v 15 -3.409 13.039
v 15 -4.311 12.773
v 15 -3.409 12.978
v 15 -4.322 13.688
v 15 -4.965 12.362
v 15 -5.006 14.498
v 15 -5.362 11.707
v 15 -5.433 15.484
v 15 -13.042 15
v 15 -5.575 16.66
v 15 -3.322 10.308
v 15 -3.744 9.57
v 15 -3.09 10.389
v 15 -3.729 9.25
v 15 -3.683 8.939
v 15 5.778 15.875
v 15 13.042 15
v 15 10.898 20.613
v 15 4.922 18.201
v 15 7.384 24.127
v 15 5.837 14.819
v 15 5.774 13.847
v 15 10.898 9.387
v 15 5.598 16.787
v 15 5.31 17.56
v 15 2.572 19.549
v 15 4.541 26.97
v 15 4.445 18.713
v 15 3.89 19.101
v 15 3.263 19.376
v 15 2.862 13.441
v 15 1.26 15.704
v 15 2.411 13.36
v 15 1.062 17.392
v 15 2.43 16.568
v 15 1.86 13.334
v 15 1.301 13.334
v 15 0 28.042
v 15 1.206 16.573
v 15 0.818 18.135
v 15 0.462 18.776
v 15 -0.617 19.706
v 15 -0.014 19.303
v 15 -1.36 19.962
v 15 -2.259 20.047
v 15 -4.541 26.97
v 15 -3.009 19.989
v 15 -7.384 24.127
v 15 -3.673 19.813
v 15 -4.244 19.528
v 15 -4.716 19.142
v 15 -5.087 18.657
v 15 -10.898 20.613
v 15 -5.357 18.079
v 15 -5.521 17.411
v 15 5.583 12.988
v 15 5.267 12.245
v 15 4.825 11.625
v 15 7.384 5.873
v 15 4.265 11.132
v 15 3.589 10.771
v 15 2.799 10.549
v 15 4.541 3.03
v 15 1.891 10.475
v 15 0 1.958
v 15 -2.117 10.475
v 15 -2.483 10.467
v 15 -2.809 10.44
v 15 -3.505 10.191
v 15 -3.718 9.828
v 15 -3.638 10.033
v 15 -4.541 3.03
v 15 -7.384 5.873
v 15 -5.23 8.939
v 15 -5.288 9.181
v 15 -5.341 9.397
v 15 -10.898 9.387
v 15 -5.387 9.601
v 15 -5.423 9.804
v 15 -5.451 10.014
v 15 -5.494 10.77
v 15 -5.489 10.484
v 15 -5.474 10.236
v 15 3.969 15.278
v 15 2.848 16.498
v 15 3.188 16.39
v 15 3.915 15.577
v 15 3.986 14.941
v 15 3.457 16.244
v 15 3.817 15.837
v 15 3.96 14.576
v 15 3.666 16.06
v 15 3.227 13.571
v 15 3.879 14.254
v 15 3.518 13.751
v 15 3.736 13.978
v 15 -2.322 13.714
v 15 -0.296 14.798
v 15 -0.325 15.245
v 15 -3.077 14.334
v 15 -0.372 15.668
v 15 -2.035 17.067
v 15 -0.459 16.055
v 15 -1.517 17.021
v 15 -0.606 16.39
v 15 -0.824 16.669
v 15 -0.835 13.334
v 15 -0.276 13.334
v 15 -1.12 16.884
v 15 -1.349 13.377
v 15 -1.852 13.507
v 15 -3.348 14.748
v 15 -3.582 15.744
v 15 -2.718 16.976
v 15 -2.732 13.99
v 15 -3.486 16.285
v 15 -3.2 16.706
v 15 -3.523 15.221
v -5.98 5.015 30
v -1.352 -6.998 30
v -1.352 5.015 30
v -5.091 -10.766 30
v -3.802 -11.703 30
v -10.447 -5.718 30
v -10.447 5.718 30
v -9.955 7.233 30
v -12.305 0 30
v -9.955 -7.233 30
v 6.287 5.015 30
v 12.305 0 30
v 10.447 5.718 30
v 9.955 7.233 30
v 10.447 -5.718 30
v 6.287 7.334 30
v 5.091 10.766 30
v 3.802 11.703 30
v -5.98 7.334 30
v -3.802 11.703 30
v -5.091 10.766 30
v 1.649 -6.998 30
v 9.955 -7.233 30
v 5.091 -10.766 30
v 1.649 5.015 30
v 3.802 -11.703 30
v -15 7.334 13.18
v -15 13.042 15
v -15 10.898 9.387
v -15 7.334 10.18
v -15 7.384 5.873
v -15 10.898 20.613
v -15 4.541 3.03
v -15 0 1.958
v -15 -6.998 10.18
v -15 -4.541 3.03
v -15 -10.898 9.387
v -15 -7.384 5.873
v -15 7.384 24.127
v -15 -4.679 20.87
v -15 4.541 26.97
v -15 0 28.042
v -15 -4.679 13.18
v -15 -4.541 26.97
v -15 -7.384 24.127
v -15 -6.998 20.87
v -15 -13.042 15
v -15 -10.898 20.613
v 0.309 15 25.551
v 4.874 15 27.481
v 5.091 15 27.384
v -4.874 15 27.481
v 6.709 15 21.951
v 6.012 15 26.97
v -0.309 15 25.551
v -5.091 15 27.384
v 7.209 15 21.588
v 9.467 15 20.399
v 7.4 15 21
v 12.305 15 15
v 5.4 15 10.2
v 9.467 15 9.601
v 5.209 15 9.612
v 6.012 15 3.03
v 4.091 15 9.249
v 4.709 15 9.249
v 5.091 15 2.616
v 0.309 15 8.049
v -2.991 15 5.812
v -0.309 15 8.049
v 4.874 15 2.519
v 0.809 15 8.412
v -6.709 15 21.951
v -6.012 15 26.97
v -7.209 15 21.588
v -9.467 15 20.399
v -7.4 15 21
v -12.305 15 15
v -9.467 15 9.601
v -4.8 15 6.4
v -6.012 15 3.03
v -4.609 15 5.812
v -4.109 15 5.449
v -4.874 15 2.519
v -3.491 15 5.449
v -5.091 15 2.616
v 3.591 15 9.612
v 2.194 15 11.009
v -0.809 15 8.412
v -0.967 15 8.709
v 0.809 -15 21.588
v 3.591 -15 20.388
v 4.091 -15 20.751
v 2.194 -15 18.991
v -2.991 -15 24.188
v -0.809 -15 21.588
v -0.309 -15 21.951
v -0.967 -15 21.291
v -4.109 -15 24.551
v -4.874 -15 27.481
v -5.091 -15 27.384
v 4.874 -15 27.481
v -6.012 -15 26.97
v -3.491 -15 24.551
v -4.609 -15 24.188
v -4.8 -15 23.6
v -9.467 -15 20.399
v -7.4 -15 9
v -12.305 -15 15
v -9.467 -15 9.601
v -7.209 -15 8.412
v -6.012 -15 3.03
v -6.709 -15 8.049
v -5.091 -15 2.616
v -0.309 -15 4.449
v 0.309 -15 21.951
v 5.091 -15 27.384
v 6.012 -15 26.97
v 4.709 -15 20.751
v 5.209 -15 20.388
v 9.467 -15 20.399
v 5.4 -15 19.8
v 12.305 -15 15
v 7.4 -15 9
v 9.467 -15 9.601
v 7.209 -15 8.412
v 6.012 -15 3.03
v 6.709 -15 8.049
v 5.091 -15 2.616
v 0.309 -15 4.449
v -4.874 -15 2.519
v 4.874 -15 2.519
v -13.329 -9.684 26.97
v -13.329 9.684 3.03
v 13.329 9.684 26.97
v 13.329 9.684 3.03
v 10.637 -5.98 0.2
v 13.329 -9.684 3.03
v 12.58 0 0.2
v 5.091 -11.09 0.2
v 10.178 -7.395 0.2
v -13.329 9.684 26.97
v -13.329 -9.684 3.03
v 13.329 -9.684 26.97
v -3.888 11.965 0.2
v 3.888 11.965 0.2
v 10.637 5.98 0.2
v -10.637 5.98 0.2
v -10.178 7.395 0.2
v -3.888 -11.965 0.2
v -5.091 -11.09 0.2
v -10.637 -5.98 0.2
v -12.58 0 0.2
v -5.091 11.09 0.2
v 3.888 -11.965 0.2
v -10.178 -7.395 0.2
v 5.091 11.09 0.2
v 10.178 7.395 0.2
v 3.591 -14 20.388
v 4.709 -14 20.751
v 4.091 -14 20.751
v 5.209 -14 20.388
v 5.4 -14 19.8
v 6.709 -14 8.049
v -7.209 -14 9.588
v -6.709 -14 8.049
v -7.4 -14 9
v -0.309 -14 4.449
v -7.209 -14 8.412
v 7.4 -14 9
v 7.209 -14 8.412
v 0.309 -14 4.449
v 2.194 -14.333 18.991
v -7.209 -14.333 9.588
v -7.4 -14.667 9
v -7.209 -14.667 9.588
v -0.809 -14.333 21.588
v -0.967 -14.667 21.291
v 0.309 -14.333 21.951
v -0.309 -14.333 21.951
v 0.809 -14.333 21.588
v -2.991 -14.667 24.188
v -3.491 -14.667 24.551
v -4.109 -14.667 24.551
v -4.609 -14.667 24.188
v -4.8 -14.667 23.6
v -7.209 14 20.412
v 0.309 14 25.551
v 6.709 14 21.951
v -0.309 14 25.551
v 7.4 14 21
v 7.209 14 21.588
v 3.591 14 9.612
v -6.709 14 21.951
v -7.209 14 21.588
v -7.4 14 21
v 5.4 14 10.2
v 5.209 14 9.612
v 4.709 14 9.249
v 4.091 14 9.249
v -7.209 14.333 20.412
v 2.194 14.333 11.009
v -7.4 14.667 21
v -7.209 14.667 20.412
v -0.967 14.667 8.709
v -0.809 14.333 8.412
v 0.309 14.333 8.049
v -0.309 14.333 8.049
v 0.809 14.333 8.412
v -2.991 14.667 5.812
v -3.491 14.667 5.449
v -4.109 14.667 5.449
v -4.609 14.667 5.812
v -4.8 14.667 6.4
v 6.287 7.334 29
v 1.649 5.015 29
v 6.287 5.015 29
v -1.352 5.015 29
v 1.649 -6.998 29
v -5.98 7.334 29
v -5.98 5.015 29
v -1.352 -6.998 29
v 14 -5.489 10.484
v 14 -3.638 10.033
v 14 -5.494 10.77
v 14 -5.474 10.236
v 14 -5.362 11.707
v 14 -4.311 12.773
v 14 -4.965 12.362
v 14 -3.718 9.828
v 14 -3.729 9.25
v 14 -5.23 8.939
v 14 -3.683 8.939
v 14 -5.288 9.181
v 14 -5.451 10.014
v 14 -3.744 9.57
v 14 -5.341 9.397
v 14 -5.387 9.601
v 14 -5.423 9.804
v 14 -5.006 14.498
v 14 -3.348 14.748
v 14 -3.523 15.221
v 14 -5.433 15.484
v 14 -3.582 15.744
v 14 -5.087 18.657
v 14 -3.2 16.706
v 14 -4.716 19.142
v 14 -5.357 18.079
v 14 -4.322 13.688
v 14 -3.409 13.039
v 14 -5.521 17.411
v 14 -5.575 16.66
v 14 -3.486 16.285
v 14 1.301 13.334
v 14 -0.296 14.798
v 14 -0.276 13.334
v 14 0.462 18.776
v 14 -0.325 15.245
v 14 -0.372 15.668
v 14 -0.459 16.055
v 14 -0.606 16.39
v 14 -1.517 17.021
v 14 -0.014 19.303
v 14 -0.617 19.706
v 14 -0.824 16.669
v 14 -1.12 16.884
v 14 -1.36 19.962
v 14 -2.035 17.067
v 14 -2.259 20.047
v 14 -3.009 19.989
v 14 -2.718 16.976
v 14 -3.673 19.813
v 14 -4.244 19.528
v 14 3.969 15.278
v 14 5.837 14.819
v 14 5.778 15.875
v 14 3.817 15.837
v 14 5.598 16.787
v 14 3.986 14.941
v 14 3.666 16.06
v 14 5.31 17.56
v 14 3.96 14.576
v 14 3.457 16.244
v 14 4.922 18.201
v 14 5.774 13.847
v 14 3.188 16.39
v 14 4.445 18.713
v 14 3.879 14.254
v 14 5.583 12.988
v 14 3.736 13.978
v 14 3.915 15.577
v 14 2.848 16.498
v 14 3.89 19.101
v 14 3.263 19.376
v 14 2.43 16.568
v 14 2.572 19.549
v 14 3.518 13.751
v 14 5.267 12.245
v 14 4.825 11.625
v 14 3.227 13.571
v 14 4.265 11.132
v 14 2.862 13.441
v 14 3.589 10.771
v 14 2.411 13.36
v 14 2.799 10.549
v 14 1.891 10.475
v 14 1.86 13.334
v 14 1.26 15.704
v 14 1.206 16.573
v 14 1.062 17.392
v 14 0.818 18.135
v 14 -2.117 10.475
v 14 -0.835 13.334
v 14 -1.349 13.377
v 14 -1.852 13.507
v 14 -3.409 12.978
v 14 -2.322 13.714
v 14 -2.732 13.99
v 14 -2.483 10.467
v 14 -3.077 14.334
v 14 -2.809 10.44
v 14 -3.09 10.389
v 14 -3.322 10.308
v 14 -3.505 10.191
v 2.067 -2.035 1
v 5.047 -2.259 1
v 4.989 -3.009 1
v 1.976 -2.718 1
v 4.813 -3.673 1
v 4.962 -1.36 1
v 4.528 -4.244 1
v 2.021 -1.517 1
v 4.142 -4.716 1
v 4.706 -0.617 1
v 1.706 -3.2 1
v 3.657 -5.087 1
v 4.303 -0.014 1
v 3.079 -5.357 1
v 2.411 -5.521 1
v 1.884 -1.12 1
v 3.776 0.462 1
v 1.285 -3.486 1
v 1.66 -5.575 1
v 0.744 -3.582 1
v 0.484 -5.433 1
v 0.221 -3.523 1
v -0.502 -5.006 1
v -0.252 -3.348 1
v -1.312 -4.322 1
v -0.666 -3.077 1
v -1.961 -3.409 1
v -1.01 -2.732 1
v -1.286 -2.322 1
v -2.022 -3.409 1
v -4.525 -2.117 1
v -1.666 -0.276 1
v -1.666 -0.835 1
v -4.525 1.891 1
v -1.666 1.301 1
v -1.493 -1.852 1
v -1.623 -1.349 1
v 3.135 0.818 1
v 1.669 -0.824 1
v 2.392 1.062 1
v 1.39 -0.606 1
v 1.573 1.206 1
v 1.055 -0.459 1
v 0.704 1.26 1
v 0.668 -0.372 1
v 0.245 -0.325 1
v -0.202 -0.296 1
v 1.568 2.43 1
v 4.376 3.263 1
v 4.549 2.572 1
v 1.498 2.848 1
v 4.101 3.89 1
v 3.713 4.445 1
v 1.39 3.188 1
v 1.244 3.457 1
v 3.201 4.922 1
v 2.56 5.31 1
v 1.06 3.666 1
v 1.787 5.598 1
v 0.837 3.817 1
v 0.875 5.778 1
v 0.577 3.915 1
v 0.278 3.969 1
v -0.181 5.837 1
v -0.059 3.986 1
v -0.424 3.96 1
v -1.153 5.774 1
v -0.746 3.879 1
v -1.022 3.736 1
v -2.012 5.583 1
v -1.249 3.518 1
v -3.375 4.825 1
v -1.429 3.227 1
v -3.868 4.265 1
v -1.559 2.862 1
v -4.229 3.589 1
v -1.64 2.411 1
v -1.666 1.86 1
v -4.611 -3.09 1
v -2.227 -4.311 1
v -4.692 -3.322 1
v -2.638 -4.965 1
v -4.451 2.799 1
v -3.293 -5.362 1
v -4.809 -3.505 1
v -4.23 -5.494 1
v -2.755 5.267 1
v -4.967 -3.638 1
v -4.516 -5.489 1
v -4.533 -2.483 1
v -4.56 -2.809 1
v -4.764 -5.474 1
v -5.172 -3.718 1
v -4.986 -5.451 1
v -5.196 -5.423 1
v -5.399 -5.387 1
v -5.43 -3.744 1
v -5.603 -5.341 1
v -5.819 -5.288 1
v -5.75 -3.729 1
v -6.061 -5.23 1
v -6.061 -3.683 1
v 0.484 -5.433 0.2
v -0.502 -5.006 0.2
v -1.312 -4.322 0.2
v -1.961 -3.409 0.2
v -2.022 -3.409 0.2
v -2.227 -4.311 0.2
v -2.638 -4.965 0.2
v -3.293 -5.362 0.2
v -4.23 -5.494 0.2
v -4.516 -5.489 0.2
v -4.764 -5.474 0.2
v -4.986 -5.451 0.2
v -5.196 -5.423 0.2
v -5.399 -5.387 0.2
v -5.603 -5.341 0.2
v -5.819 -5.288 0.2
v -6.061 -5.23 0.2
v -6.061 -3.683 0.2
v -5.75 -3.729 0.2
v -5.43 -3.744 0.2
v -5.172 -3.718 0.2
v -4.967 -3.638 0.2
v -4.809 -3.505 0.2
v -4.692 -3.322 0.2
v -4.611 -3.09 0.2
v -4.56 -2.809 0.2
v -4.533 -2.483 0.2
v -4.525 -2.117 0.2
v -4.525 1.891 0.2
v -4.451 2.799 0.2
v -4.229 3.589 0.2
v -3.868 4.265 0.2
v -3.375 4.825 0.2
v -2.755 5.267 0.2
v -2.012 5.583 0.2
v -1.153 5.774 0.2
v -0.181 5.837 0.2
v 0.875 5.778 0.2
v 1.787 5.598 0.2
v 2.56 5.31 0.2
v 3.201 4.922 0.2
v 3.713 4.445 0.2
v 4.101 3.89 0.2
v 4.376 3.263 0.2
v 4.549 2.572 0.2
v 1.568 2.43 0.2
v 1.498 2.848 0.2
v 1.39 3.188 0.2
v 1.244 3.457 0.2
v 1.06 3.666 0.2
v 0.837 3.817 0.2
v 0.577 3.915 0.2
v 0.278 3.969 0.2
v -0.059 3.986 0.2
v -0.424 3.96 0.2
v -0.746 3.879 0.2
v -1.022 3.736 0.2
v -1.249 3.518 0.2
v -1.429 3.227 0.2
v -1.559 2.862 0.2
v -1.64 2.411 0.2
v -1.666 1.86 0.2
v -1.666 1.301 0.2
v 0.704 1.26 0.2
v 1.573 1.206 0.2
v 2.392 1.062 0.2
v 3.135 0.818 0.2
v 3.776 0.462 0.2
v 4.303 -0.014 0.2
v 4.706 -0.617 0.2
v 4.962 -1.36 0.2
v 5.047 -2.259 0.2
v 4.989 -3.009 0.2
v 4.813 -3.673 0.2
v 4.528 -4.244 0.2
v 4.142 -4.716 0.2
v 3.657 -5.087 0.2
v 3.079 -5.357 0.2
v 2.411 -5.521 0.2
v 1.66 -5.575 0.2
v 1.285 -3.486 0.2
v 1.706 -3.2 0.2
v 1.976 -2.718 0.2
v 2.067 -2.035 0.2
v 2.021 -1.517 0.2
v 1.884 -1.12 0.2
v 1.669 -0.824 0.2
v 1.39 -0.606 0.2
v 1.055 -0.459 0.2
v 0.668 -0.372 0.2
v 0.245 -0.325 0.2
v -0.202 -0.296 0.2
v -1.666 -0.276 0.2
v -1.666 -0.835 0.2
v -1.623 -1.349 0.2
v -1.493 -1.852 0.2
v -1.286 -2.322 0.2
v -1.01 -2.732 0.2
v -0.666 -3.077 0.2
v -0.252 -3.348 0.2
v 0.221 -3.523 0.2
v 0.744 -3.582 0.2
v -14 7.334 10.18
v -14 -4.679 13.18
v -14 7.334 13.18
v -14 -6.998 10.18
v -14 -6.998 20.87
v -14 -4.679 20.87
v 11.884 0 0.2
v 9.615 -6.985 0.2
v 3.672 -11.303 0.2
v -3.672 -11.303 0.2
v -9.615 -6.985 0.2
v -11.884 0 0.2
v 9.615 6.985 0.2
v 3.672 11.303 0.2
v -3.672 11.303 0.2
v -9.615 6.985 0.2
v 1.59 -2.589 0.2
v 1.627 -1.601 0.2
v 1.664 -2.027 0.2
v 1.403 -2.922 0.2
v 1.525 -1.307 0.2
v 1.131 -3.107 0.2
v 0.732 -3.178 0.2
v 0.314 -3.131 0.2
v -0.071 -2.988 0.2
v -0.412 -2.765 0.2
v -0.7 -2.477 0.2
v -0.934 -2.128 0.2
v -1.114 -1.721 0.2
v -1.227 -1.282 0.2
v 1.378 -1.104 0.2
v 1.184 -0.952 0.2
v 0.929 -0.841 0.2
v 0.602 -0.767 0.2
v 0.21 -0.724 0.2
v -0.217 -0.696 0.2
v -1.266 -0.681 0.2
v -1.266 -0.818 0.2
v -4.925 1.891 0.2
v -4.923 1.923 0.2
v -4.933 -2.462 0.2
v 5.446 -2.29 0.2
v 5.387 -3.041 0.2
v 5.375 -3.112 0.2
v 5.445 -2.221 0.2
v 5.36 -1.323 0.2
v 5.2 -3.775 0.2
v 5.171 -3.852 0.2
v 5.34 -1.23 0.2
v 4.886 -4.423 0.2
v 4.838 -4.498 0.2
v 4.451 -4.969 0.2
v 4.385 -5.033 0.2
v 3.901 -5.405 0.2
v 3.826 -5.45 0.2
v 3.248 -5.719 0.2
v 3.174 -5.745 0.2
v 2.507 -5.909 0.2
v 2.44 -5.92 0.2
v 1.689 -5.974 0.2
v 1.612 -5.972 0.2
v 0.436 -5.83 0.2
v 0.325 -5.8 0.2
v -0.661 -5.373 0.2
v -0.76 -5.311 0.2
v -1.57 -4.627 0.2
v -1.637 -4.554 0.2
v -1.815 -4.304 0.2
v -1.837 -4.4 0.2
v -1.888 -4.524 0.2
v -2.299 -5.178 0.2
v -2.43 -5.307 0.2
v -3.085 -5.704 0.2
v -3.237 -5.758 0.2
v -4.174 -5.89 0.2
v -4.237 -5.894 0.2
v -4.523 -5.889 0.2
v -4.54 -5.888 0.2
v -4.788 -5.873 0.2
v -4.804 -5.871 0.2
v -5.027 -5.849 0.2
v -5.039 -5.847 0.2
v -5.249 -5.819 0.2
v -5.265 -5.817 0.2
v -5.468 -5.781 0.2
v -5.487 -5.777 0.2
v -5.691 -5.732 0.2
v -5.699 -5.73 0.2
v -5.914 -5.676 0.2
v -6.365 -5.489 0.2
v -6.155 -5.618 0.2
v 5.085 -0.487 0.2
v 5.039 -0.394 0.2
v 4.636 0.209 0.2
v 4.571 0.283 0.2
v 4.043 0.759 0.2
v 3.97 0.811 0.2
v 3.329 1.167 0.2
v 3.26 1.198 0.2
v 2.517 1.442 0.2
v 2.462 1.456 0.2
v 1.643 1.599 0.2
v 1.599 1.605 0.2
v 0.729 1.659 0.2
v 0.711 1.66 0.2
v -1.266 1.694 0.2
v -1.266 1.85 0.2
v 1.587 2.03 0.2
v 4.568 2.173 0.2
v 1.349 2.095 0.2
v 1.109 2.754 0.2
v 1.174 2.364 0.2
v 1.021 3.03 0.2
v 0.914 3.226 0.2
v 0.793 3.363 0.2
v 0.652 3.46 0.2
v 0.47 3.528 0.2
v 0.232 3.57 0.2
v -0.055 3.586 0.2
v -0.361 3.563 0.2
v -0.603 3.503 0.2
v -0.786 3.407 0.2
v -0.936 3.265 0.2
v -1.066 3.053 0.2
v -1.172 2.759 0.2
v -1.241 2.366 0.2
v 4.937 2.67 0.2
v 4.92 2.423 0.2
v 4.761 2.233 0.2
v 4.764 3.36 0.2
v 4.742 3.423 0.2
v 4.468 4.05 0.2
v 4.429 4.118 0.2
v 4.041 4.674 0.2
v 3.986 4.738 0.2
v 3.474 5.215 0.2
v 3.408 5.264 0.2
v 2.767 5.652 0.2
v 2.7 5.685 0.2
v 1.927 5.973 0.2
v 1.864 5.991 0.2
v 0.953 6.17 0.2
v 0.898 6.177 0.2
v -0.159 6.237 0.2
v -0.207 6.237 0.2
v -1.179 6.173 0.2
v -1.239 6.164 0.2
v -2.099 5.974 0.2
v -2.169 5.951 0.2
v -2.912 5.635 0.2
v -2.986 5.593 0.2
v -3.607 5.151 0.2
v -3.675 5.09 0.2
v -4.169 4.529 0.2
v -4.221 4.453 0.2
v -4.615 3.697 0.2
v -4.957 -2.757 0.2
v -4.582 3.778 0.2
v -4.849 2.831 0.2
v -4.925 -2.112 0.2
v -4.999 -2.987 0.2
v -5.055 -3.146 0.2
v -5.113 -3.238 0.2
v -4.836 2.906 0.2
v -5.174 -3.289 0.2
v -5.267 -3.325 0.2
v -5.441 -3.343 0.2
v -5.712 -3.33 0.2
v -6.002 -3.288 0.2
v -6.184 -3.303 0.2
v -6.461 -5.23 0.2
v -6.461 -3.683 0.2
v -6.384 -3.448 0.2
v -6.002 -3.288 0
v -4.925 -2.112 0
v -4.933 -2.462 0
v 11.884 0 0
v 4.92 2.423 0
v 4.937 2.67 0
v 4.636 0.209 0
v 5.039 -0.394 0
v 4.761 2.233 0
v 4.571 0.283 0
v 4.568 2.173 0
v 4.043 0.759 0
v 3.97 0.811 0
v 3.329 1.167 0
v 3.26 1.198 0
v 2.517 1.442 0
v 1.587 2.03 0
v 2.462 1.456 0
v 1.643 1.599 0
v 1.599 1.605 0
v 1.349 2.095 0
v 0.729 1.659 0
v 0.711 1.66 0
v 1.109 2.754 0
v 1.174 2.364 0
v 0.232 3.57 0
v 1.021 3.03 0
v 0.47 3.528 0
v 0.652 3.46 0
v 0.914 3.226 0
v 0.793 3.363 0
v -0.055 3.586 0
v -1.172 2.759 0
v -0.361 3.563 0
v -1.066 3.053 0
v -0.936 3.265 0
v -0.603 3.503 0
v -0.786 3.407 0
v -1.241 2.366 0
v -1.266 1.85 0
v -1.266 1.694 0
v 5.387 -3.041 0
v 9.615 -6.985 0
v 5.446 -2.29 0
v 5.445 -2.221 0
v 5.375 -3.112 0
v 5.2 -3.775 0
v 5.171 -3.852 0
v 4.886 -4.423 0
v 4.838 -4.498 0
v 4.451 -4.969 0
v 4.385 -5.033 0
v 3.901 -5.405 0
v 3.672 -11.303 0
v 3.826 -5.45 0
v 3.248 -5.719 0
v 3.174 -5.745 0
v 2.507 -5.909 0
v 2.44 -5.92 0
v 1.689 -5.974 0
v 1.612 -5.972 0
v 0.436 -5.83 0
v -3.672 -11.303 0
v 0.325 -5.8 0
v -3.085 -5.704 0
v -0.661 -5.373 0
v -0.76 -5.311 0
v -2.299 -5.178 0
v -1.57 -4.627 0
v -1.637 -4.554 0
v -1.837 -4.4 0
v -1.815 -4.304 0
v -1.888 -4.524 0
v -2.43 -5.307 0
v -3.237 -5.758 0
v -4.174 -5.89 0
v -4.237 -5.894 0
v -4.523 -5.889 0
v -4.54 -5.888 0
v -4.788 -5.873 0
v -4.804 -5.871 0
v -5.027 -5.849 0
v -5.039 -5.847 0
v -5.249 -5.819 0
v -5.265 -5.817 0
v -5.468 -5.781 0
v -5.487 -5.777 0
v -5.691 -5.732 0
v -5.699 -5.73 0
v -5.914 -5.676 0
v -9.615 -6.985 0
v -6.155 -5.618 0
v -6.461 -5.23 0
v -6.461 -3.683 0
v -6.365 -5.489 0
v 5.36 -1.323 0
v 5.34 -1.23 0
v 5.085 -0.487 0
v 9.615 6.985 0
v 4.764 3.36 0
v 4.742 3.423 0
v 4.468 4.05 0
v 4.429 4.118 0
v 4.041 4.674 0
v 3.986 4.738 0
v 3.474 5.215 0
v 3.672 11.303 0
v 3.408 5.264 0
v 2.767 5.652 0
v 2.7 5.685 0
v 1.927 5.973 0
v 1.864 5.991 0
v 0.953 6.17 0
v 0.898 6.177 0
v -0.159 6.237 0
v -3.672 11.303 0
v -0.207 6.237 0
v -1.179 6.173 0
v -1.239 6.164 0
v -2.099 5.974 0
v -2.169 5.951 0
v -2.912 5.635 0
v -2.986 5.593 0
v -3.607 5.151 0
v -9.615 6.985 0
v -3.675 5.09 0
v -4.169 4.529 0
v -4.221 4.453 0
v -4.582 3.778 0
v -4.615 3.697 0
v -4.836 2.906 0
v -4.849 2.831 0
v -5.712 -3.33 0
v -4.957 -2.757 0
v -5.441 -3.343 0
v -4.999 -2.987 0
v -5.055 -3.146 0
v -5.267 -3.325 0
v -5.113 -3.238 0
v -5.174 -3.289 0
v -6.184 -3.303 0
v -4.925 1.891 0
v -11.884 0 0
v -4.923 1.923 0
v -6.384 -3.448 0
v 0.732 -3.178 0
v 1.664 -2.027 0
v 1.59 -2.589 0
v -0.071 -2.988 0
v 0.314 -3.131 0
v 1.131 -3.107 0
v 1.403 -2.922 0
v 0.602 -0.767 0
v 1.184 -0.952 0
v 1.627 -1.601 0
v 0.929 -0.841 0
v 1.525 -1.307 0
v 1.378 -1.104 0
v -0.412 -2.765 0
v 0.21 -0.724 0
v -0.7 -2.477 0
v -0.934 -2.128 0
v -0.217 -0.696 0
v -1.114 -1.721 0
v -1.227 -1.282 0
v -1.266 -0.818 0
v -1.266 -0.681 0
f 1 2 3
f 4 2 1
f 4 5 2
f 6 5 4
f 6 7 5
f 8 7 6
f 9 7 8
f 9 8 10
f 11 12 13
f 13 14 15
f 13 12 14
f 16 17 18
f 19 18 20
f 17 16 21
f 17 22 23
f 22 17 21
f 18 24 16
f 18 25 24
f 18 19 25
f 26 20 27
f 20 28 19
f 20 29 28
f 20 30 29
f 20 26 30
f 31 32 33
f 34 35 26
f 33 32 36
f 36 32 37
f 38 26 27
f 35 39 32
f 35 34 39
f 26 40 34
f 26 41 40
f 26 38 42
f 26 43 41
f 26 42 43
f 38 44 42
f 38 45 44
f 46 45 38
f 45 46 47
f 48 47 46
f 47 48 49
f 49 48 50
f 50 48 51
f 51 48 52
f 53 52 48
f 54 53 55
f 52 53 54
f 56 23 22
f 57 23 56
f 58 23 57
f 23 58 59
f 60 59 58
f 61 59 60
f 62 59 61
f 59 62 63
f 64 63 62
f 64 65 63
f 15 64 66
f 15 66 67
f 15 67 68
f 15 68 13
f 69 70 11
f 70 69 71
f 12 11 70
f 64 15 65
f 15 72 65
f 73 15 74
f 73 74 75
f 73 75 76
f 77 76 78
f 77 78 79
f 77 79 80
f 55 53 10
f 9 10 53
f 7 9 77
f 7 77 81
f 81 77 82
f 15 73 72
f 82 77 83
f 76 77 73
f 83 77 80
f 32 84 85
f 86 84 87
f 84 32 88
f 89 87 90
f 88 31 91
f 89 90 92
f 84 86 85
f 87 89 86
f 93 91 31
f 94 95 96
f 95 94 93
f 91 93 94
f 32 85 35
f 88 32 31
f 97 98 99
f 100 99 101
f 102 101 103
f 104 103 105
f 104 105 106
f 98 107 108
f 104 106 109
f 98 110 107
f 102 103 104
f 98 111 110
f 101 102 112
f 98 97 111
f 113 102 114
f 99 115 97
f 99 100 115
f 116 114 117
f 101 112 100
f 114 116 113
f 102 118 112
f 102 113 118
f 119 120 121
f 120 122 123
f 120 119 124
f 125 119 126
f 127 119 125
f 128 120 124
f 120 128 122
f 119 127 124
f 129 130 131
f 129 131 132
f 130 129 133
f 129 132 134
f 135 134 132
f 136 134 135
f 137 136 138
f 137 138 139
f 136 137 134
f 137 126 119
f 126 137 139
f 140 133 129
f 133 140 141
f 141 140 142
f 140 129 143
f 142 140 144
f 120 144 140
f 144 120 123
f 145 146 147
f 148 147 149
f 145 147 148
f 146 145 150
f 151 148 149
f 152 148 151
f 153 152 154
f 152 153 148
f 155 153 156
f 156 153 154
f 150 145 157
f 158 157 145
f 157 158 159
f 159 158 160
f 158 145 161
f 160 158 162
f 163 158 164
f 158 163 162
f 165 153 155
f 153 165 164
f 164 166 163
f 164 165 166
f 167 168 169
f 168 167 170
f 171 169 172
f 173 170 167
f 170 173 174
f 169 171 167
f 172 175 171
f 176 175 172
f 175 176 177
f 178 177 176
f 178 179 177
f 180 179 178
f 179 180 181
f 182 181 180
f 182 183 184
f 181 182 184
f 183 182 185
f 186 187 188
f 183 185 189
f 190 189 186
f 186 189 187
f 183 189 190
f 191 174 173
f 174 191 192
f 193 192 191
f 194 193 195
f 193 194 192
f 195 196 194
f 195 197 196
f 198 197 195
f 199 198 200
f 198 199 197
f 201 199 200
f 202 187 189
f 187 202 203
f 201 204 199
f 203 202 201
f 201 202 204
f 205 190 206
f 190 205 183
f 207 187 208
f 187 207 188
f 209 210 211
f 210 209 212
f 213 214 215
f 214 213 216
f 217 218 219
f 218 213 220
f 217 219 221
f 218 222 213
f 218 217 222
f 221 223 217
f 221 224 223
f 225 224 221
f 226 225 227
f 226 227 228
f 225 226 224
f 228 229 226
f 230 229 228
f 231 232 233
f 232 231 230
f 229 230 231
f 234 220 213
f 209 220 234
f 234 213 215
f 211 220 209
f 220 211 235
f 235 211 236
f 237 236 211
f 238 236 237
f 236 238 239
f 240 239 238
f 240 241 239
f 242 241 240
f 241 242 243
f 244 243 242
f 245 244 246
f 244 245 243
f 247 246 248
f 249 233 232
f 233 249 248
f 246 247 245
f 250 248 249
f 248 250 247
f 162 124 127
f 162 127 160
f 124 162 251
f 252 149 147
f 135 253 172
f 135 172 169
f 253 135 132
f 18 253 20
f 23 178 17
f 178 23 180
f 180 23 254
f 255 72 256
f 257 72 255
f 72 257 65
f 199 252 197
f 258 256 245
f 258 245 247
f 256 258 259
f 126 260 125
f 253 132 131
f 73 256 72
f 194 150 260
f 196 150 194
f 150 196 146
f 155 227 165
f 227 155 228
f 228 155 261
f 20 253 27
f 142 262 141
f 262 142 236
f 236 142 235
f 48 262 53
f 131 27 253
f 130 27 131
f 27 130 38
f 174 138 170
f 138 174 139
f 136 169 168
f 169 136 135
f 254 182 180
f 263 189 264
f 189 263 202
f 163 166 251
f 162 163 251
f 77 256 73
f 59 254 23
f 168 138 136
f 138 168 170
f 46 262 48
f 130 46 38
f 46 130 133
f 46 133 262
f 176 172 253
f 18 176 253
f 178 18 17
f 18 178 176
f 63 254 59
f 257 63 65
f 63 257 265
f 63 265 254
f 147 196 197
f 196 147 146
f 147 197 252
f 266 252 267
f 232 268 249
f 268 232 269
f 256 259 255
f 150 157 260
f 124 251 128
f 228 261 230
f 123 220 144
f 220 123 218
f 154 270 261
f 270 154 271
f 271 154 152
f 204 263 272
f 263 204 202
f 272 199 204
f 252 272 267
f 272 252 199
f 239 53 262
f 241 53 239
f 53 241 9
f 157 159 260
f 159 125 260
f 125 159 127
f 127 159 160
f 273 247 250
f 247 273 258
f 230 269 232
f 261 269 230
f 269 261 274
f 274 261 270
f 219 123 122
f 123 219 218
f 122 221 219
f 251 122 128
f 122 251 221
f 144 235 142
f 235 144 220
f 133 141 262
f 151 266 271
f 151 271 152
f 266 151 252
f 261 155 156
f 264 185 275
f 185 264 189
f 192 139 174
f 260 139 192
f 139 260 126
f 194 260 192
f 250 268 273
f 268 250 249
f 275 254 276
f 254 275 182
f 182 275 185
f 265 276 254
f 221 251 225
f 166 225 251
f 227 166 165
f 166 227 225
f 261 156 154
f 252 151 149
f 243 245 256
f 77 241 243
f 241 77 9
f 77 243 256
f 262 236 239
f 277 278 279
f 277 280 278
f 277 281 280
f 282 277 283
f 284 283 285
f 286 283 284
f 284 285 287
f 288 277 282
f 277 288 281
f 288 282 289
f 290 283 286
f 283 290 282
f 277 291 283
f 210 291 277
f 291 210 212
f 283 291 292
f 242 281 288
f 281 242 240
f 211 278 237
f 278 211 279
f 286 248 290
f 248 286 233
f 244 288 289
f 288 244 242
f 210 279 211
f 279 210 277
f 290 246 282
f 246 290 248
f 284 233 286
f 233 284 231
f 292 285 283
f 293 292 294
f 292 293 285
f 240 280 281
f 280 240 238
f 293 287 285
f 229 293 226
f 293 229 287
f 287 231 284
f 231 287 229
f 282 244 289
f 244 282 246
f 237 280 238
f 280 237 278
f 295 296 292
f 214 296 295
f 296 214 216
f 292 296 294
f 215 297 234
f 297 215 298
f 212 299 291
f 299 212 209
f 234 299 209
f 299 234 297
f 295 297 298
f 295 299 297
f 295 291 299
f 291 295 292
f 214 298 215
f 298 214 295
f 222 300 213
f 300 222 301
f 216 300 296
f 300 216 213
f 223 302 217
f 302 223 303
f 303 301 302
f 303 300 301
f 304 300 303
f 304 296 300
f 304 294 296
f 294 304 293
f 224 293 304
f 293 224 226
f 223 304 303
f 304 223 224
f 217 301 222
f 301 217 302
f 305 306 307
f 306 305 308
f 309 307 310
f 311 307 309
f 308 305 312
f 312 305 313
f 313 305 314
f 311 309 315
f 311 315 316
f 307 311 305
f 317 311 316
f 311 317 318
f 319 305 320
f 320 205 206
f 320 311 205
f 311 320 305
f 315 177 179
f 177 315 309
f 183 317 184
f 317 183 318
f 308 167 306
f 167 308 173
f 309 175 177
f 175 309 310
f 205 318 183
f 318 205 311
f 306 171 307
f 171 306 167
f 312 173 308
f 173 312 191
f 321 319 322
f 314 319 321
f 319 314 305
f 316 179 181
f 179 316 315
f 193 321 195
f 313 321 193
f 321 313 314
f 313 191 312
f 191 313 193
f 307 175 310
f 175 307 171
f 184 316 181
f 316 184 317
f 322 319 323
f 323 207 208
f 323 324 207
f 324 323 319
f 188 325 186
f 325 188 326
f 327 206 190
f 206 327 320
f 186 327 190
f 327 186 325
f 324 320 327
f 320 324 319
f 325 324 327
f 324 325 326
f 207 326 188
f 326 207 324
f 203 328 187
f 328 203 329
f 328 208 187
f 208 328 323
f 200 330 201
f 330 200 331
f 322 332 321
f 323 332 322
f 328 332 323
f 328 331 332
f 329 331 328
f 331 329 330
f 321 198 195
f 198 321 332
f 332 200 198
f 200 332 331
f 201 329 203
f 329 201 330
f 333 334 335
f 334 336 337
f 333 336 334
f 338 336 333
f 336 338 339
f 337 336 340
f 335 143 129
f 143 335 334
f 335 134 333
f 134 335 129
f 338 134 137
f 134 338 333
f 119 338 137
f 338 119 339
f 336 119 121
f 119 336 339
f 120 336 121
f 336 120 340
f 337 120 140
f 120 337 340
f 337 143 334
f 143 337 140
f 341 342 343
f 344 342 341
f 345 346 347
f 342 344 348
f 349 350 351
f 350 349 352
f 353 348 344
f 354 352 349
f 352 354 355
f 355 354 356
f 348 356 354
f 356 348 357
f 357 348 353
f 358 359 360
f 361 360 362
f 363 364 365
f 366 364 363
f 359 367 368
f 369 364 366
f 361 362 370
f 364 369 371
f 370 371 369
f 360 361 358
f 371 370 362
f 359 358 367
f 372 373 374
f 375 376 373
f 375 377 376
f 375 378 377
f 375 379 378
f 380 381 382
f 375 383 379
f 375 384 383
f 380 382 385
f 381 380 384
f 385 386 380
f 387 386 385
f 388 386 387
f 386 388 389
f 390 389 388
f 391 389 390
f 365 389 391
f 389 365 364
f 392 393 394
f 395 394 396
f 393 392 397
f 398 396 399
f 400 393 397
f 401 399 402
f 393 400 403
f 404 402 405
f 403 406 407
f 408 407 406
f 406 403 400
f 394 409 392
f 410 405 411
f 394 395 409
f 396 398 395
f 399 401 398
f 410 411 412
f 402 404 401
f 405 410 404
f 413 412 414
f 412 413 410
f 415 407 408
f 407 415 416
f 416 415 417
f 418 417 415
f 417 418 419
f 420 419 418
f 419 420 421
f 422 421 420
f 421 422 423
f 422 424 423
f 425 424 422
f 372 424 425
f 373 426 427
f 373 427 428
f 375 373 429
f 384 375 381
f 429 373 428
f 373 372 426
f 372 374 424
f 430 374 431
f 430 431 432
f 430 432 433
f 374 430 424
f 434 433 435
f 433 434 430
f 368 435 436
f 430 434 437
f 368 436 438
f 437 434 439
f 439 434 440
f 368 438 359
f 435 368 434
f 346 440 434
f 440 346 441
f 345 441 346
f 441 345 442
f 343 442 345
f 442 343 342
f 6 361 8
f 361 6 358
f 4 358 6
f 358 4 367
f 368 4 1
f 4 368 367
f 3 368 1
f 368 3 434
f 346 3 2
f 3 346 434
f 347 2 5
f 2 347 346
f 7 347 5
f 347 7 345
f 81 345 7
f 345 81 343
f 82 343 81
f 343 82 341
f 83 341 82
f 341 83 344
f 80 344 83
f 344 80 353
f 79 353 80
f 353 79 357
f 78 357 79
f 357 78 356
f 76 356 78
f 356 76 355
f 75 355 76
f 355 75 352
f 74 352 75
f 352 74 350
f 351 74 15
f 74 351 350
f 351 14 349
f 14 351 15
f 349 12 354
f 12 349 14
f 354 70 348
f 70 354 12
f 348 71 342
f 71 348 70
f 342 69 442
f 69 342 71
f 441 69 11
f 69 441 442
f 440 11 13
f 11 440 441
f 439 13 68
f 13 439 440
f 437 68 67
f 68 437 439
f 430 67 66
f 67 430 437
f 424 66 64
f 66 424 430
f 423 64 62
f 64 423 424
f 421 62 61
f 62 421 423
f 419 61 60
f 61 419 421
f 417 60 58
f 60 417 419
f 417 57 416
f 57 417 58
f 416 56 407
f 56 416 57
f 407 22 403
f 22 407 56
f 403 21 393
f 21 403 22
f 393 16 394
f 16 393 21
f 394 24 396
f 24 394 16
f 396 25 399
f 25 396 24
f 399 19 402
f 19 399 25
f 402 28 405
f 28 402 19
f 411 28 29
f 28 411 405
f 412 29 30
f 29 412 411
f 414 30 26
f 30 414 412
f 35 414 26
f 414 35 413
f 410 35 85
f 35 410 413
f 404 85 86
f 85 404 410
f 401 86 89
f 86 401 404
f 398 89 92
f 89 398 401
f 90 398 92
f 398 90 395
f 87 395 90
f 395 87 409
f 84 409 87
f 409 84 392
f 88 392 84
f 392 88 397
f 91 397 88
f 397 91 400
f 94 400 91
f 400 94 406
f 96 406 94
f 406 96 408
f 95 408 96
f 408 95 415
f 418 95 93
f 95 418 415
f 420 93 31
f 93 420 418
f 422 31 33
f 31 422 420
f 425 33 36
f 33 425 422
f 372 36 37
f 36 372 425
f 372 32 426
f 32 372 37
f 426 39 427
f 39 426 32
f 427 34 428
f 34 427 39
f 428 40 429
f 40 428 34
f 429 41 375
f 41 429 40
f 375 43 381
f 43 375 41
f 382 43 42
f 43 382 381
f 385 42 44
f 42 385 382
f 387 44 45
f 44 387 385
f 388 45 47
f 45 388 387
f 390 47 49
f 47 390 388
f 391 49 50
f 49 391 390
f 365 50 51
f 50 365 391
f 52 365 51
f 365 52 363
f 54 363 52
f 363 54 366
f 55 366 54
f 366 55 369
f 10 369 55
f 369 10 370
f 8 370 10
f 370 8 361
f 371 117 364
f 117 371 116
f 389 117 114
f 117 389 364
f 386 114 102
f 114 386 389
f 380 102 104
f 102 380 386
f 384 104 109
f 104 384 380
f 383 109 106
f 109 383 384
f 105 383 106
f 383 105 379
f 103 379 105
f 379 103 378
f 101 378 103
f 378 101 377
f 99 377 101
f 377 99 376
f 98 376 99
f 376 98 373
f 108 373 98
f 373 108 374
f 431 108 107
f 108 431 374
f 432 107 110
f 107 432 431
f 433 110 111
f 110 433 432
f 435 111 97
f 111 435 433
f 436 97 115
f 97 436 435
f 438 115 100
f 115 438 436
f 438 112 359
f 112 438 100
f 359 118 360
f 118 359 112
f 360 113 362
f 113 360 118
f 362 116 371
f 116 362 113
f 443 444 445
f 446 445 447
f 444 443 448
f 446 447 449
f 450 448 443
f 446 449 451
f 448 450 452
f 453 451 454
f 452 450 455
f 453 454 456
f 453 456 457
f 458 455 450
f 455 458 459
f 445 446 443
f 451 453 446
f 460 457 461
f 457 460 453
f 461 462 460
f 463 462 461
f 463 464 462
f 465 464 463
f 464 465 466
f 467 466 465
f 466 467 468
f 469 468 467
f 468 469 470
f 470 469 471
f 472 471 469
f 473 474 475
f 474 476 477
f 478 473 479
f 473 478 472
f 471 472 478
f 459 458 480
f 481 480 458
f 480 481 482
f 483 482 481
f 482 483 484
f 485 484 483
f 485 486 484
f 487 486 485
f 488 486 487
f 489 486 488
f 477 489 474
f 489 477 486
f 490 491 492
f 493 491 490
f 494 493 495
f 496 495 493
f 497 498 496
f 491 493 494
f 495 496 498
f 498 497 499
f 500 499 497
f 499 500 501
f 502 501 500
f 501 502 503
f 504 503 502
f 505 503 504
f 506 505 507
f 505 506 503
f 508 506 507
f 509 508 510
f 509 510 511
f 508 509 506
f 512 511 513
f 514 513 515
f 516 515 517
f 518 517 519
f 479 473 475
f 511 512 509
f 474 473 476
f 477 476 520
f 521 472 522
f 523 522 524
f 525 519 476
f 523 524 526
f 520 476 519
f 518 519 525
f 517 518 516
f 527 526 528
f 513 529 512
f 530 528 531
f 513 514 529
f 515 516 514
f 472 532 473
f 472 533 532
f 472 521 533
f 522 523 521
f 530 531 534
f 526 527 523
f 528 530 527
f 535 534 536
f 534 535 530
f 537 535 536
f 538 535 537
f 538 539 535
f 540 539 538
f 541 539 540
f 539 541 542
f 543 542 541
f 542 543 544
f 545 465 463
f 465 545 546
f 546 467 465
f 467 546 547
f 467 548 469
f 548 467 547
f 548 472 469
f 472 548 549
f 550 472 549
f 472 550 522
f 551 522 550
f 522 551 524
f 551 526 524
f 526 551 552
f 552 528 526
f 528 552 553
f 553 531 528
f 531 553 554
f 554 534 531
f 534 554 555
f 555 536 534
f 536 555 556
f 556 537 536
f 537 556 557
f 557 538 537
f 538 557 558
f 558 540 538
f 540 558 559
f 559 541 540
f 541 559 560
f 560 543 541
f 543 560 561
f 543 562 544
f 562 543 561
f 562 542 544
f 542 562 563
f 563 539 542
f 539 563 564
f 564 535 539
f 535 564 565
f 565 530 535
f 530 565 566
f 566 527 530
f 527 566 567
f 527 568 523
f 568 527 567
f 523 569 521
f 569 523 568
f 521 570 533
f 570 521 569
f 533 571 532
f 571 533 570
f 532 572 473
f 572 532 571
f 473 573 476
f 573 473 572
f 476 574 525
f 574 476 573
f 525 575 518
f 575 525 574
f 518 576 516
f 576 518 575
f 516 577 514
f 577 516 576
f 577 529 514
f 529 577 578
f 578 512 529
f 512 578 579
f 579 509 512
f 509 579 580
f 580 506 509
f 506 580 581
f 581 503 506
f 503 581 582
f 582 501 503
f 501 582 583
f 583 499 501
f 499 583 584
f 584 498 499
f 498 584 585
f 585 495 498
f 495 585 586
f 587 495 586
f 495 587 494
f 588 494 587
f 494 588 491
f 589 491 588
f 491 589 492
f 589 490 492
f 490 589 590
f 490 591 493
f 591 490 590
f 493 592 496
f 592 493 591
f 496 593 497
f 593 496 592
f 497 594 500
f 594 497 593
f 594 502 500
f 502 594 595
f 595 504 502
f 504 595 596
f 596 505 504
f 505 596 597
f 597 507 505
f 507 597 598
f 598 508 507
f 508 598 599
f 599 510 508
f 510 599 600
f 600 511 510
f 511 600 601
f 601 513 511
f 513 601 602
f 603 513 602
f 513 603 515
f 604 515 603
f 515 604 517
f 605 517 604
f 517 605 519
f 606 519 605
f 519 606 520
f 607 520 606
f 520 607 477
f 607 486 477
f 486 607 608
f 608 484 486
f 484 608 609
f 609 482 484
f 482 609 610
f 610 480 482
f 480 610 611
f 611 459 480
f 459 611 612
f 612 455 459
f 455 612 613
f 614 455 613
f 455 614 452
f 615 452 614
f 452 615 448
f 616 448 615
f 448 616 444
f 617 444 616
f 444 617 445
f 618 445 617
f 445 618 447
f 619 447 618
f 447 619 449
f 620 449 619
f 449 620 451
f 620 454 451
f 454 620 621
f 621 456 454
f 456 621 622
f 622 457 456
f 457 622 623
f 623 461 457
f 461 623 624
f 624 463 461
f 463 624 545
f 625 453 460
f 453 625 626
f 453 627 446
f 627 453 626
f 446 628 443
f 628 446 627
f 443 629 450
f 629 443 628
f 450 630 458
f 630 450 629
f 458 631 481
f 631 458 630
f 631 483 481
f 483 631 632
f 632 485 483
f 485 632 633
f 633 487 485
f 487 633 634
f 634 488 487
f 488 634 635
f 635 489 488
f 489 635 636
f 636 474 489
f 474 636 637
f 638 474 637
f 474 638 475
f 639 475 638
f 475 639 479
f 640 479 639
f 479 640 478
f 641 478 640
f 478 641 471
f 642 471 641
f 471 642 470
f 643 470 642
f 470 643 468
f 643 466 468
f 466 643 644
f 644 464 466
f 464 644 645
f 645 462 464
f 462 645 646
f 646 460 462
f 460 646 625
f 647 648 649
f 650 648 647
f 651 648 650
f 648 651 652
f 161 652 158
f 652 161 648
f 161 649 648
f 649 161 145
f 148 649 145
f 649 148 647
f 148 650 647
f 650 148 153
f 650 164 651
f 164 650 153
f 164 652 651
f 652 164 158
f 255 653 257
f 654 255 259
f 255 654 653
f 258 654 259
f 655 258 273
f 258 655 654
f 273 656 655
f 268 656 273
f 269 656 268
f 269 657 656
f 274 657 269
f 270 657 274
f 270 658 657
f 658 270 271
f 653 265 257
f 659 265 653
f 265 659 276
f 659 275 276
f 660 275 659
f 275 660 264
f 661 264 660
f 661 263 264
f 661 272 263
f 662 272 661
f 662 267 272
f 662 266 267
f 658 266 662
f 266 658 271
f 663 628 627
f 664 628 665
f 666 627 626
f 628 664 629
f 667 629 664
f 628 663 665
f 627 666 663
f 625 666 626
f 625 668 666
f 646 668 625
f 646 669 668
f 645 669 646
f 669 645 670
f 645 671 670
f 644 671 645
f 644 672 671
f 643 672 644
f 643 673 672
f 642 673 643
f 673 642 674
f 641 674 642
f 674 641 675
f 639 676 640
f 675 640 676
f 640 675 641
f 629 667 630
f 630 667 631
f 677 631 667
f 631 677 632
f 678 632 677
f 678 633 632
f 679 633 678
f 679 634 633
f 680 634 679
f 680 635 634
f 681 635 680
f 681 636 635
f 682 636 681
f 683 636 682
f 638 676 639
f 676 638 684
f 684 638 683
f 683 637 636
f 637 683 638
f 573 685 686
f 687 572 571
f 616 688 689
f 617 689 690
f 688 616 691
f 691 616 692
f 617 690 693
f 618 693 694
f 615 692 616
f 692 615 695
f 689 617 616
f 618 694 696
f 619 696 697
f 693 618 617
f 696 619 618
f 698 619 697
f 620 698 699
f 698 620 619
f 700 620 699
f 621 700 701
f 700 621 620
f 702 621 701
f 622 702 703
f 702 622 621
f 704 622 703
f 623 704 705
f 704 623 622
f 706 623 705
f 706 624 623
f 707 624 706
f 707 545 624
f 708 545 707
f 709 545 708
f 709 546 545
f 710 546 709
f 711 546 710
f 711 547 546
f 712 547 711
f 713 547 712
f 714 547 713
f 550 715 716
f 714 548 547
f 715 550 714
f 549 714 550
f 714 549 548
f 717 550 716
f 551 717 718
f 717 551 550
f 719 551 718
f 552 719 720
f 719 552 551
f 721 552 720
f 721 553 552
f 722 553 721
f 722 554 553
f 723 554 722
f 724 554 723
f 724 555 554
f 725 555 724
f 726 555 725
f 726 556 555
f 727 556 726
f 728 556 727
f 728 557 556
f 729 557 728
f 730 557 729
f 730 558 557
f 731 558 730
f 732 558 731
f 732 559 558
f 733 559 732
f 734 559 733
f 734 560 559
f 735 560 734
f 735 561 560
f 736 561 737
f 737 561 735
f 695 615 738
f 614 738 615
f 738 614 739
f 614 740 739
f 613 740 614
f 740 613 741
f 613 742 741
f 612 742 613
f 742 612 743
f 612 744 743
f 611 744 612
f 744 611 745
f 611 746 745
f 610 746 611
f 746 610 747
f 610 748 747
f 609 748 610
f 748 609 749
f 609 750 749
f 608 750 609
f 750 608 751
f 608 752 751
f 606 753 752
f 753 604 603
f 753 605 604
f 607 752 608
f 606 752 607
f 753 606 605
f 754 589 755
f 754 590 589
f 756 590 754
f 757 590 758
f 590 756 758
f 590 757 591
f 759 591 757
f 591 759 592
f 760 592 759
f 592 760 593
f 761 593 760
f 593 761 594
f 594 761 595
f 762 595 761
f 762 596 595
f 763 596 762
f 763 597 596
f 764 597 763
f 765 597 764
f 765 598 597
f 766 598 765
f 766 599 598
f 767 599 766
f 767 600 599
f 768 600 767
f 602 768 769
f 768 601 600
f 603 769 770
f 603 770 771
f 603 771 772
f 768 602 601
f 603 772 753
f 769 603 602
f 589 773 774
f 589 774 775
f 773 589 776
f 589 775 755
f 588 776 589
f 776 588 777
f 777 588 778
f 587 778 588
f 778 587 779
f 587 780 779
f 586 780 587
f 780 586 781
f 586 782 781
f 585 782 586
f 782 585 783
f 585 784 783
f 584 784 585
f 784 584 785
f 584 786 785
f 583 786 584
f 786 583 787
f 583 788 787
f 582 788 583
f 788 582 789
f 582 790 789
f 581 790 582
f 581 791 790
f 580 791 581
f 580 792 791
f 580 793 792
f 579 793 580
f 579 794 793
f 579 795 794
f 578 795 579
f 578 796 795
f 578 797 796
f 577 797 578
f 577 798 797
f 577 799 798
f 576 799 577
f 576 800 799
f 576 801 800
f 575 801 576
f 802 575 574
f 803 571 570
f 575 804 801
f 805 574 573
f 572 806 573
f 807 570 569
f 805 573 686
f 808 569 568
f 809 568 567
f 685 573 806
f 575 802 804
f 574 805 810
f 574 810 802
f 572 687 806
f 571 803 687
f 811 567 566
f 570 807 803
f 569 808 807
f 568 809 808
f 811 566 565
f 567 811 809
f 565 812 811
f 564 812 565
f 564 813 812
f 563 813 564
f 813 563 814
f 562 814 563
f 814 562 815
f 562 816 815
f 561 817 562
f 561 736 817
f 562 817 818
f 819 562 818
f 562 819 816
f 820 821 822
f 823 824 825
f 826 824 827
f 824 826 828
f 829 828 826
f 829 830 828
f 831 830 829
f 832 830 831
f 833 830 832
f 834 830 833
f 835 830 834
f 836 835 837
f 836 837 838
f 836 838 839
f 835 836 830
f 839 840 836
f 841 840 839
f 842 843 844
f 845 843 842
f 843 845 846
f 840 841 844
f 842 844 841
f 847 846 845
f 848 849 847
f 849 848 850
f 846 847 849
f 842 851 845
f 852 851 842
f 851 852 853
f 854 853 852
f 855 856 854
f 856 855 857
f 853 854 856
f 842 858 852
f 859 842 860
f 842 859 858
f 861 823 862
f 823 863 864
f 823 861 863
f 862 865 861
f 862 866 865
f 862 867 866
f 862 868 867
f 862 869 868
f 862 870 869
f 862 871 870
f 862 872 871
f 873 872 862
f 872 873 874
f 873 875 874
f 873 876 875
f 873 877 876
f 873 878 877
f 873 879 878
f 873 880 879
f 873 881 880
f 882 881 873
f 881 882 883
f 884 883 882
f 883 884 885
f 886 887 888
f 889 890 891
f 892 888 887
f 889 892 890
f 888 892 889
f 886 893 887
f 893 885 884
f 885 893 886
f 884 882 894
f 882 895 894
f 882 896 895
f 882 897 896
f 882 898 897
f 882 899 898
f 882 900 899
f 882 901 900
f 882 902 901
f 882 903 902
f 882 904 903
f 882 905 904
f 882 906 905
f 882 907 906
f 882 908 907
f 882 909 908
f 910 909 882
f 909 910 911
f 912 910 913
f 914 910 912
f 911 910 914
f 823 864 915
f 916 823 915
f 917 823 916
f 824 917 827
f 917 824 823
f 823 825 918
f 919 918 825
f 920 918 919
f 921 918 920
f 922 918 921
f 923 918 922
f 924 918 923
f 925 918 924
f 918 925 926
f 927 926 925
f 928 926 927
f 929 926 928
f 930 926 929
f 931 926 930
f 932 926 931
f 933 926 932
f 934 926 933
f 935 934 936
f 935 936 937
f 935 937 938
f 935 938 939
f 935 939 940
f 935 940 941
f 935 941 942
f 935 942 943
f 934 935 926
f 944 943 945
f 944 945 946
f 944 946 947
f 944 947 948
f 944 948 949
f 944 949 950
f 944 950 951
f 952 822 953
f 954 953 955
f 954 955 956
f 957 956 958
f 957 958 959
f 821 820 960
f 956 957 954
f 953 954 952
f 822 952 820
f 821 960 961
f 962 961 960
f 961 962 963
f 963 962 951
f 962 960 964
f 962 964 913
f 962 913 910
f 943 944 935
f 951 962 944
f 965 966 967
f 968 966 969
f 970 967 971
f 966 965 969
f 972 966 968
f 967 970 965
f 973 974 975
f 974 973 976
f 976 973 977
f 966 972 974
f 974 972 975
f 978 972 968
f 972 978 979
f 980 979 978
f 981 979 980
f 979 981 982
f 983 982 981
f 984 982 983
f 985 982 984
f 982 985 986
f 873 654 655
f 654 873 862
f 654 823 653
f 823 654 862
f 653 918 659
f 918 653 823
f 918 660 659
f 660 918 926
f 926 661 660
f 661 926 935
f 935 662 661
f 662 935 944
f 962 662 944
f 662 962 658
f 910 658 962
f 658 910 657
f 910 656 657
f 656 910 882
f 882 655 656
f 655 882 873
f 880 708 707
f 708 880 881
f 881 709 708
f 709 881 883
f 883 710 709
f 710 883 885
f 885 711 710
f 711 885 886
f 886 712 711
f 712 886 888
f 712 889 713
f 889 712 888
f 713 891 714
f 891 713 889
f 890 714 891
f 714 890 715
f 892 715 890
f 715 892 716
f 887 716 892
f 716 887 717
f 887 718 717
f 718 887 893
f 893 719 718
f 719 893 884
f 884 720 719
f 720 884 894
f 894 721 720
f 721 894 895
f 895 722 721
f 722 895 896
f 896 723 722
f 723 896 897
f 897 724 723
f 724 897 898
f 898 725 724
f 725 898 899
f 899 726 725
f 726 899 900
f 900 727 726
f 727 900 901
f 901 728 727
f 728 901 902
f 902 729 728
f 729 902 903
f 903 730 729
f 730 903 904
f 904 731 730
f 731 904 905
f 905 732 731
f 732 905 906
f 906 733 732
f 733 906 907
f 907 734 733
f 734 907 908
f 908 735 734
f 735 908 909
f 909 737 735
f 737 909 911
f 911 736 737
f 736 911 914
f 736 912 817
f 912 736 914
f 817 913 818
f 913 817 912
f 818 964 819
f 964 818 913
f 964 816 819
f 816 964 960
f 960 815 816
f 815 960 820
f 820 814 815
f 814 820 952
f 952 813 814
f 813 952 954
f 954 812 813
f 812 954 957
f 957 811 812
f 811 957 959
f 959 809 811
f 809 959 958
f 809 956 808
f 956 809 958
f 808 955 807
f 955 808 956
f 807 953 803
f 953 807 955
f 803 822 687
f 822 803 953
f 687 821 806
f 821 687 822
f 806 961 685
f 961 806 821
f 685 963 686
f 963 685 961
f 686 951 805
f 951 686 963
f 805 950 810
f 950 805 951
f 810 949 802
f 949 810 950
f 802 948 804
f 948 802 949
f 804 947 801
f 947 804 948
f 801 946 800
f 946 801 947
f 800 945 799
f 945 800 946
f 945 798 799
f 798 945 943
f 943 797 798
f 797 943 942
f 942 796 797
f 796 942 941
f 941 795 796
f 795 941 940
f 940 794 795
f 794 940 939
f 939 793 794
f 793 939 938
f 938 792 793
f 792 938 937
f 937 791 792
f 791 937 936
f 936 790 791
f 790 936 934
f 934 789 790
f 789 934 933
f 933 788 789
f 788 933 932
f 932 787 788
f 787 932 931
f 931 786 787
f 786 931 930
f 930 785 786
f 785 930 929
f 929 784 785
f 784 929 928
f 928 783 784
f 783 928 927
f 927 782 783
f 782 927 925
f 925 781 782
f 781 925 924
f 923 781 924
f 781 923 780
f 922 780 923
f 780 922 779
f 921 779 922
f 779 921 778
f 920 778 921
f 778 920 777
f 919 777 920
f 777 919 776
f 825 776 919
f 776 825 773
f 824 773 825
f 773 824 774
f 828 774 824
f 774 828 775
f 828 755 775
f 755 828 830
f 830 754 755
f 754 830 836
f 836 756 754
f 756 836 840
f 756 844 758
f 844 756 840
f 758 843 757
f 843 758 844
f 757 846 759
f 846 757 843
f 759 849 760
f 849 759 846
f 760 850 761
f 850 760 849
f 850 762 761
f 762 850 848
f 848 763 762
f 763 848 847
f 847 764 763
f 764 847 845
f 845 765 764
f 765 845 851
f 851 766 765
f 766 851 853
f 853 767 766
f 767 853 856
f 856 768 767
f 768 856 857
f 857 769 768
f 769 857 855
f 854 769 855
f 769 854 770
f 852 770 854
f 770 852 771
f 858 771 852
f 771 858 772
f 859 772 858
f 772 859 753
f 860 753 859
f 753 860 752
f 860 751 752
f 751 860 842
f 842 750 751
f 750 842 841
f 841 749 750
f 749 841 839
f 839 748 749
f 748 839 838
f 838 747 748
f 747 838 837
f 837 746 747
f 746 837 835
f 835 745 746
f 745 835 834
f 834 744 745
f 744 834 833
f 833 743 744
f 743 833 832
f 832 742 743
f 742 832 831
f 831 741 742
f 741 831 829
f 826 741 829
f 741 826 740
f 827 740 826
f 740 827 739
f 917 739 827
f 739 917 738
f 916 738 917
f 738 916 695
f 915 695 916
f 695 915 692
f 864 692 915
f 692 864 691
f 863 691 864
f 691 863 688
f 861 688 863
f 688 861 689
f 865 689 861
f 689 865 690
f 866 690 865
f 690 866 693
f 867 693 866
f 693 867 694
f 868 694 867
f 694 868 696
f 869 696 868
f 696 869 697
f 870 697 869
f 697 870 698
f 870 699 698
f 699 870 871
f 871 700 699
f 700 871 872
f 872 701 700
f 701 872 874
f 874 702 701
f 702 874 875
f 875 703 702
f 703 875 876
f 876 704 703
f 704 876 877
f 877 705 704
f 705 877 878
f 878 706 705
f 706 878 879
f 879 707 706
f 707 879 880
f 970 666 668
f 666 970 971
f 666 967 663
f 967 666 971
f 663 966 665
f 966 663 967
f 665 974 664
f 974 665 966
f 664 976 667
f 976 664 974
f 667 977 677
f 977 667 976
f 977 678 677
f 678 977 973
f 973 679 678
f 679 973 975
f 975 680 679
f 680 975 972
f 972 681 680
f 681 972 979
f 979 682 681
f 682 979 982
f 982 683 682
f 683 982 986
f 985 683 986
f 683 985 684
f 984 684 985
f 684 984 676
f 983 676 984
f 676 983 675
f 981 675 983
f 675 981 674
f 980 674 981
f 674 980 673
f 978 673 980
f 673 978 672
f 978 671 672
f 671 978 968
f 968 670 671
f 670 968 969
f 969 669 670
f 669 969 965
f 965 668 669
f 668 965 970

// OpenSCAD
$fn=10;

d = 30;
r = d/2;
k = 0.96;
d2 = d * sqrt(2) * k;
depth =  1;

module inset_bottom(w=0.4, h=0.2, bounding_size = 200, eps=0.01) {
  if (w == 0 || h < 0) {
    children();
  } else {
    // The top part of the children without the inset layer.
    difference() {
      children();
      // TODO: use actual extended children projection instead
      // of a clube with arbitrary large x,y values.
      translate([0, 0, -9*h])
          cube([bounding_size, bounding_size, 20*h], center=true);
    }
    // The inset layer.
    linear_extrude(height=h+eps) offset(r = -w) projection(cut=true)
      children();
  }
}

module body() {
  intersection() {
     cube([d, d, d], center=true);
     sphere(d=d2); 
  }
}

module label(letter = "?") {
 translate([0, 0, r-depth]) linear_extrude(height = 5)
       text(text = letter, font = "Arial:style=Bold", valign="center", halign="center", size = 15);
}

module main() {
  difference() {
    body();
    
    label("T");
    rotate([0, 90, 0]) rotate([0, 0, 0]) label("a");
    rotate([0, 180, 0]) label("a");
    
    rotate([0, 270, 0]) label("L");
    //rotate([90, 0, 0]) label("A");
    //rotate([-90, 0, 0]) label("B");
    
    rotate([90, 0, 0]) translate([0, 0, r-depth]) fb();
    rotate([-90, 0, 0]) translate([0, 0, r-depth]) fb();

  }
}

//inset_bottom()
//translate([0, 0, r]) main();
module fb_base(x, y) {
  k=0.2;
  translate([0, -d*0.2, 0]) 
hull() {
translate([0, -18*k, 0]) cylinder(d=2, h=5);

translate([-32*k, 0, 0]) cylinder(d=2, h=5);
translate([32*k, 0, 0]) cylinder(d=2, h=5);
       translate([x*k, y*k, 0]) cylinder(d=2, h=5);
}
}

module fb() {
  //hull() {
    fb_base(22, 60-6);
     //translate([22, 60-6, 0]) cylinder(d=2, h=5);
 // }

  translate([0, 0, depth/3]) //hull() {
    fb_base(0, 60);
    //translate([0, 60, 0]) cylinder(d=2, h=5);
  //}

  translate([0, 0, 2*depth/3]) //hull() {
    fb_base(-19, 60+13);
    //translate([-19, 60+13, 0]) cylinder(d=2, h=5);
  //}

}

inset_bottom()
translate([0, 0, r])
main();
